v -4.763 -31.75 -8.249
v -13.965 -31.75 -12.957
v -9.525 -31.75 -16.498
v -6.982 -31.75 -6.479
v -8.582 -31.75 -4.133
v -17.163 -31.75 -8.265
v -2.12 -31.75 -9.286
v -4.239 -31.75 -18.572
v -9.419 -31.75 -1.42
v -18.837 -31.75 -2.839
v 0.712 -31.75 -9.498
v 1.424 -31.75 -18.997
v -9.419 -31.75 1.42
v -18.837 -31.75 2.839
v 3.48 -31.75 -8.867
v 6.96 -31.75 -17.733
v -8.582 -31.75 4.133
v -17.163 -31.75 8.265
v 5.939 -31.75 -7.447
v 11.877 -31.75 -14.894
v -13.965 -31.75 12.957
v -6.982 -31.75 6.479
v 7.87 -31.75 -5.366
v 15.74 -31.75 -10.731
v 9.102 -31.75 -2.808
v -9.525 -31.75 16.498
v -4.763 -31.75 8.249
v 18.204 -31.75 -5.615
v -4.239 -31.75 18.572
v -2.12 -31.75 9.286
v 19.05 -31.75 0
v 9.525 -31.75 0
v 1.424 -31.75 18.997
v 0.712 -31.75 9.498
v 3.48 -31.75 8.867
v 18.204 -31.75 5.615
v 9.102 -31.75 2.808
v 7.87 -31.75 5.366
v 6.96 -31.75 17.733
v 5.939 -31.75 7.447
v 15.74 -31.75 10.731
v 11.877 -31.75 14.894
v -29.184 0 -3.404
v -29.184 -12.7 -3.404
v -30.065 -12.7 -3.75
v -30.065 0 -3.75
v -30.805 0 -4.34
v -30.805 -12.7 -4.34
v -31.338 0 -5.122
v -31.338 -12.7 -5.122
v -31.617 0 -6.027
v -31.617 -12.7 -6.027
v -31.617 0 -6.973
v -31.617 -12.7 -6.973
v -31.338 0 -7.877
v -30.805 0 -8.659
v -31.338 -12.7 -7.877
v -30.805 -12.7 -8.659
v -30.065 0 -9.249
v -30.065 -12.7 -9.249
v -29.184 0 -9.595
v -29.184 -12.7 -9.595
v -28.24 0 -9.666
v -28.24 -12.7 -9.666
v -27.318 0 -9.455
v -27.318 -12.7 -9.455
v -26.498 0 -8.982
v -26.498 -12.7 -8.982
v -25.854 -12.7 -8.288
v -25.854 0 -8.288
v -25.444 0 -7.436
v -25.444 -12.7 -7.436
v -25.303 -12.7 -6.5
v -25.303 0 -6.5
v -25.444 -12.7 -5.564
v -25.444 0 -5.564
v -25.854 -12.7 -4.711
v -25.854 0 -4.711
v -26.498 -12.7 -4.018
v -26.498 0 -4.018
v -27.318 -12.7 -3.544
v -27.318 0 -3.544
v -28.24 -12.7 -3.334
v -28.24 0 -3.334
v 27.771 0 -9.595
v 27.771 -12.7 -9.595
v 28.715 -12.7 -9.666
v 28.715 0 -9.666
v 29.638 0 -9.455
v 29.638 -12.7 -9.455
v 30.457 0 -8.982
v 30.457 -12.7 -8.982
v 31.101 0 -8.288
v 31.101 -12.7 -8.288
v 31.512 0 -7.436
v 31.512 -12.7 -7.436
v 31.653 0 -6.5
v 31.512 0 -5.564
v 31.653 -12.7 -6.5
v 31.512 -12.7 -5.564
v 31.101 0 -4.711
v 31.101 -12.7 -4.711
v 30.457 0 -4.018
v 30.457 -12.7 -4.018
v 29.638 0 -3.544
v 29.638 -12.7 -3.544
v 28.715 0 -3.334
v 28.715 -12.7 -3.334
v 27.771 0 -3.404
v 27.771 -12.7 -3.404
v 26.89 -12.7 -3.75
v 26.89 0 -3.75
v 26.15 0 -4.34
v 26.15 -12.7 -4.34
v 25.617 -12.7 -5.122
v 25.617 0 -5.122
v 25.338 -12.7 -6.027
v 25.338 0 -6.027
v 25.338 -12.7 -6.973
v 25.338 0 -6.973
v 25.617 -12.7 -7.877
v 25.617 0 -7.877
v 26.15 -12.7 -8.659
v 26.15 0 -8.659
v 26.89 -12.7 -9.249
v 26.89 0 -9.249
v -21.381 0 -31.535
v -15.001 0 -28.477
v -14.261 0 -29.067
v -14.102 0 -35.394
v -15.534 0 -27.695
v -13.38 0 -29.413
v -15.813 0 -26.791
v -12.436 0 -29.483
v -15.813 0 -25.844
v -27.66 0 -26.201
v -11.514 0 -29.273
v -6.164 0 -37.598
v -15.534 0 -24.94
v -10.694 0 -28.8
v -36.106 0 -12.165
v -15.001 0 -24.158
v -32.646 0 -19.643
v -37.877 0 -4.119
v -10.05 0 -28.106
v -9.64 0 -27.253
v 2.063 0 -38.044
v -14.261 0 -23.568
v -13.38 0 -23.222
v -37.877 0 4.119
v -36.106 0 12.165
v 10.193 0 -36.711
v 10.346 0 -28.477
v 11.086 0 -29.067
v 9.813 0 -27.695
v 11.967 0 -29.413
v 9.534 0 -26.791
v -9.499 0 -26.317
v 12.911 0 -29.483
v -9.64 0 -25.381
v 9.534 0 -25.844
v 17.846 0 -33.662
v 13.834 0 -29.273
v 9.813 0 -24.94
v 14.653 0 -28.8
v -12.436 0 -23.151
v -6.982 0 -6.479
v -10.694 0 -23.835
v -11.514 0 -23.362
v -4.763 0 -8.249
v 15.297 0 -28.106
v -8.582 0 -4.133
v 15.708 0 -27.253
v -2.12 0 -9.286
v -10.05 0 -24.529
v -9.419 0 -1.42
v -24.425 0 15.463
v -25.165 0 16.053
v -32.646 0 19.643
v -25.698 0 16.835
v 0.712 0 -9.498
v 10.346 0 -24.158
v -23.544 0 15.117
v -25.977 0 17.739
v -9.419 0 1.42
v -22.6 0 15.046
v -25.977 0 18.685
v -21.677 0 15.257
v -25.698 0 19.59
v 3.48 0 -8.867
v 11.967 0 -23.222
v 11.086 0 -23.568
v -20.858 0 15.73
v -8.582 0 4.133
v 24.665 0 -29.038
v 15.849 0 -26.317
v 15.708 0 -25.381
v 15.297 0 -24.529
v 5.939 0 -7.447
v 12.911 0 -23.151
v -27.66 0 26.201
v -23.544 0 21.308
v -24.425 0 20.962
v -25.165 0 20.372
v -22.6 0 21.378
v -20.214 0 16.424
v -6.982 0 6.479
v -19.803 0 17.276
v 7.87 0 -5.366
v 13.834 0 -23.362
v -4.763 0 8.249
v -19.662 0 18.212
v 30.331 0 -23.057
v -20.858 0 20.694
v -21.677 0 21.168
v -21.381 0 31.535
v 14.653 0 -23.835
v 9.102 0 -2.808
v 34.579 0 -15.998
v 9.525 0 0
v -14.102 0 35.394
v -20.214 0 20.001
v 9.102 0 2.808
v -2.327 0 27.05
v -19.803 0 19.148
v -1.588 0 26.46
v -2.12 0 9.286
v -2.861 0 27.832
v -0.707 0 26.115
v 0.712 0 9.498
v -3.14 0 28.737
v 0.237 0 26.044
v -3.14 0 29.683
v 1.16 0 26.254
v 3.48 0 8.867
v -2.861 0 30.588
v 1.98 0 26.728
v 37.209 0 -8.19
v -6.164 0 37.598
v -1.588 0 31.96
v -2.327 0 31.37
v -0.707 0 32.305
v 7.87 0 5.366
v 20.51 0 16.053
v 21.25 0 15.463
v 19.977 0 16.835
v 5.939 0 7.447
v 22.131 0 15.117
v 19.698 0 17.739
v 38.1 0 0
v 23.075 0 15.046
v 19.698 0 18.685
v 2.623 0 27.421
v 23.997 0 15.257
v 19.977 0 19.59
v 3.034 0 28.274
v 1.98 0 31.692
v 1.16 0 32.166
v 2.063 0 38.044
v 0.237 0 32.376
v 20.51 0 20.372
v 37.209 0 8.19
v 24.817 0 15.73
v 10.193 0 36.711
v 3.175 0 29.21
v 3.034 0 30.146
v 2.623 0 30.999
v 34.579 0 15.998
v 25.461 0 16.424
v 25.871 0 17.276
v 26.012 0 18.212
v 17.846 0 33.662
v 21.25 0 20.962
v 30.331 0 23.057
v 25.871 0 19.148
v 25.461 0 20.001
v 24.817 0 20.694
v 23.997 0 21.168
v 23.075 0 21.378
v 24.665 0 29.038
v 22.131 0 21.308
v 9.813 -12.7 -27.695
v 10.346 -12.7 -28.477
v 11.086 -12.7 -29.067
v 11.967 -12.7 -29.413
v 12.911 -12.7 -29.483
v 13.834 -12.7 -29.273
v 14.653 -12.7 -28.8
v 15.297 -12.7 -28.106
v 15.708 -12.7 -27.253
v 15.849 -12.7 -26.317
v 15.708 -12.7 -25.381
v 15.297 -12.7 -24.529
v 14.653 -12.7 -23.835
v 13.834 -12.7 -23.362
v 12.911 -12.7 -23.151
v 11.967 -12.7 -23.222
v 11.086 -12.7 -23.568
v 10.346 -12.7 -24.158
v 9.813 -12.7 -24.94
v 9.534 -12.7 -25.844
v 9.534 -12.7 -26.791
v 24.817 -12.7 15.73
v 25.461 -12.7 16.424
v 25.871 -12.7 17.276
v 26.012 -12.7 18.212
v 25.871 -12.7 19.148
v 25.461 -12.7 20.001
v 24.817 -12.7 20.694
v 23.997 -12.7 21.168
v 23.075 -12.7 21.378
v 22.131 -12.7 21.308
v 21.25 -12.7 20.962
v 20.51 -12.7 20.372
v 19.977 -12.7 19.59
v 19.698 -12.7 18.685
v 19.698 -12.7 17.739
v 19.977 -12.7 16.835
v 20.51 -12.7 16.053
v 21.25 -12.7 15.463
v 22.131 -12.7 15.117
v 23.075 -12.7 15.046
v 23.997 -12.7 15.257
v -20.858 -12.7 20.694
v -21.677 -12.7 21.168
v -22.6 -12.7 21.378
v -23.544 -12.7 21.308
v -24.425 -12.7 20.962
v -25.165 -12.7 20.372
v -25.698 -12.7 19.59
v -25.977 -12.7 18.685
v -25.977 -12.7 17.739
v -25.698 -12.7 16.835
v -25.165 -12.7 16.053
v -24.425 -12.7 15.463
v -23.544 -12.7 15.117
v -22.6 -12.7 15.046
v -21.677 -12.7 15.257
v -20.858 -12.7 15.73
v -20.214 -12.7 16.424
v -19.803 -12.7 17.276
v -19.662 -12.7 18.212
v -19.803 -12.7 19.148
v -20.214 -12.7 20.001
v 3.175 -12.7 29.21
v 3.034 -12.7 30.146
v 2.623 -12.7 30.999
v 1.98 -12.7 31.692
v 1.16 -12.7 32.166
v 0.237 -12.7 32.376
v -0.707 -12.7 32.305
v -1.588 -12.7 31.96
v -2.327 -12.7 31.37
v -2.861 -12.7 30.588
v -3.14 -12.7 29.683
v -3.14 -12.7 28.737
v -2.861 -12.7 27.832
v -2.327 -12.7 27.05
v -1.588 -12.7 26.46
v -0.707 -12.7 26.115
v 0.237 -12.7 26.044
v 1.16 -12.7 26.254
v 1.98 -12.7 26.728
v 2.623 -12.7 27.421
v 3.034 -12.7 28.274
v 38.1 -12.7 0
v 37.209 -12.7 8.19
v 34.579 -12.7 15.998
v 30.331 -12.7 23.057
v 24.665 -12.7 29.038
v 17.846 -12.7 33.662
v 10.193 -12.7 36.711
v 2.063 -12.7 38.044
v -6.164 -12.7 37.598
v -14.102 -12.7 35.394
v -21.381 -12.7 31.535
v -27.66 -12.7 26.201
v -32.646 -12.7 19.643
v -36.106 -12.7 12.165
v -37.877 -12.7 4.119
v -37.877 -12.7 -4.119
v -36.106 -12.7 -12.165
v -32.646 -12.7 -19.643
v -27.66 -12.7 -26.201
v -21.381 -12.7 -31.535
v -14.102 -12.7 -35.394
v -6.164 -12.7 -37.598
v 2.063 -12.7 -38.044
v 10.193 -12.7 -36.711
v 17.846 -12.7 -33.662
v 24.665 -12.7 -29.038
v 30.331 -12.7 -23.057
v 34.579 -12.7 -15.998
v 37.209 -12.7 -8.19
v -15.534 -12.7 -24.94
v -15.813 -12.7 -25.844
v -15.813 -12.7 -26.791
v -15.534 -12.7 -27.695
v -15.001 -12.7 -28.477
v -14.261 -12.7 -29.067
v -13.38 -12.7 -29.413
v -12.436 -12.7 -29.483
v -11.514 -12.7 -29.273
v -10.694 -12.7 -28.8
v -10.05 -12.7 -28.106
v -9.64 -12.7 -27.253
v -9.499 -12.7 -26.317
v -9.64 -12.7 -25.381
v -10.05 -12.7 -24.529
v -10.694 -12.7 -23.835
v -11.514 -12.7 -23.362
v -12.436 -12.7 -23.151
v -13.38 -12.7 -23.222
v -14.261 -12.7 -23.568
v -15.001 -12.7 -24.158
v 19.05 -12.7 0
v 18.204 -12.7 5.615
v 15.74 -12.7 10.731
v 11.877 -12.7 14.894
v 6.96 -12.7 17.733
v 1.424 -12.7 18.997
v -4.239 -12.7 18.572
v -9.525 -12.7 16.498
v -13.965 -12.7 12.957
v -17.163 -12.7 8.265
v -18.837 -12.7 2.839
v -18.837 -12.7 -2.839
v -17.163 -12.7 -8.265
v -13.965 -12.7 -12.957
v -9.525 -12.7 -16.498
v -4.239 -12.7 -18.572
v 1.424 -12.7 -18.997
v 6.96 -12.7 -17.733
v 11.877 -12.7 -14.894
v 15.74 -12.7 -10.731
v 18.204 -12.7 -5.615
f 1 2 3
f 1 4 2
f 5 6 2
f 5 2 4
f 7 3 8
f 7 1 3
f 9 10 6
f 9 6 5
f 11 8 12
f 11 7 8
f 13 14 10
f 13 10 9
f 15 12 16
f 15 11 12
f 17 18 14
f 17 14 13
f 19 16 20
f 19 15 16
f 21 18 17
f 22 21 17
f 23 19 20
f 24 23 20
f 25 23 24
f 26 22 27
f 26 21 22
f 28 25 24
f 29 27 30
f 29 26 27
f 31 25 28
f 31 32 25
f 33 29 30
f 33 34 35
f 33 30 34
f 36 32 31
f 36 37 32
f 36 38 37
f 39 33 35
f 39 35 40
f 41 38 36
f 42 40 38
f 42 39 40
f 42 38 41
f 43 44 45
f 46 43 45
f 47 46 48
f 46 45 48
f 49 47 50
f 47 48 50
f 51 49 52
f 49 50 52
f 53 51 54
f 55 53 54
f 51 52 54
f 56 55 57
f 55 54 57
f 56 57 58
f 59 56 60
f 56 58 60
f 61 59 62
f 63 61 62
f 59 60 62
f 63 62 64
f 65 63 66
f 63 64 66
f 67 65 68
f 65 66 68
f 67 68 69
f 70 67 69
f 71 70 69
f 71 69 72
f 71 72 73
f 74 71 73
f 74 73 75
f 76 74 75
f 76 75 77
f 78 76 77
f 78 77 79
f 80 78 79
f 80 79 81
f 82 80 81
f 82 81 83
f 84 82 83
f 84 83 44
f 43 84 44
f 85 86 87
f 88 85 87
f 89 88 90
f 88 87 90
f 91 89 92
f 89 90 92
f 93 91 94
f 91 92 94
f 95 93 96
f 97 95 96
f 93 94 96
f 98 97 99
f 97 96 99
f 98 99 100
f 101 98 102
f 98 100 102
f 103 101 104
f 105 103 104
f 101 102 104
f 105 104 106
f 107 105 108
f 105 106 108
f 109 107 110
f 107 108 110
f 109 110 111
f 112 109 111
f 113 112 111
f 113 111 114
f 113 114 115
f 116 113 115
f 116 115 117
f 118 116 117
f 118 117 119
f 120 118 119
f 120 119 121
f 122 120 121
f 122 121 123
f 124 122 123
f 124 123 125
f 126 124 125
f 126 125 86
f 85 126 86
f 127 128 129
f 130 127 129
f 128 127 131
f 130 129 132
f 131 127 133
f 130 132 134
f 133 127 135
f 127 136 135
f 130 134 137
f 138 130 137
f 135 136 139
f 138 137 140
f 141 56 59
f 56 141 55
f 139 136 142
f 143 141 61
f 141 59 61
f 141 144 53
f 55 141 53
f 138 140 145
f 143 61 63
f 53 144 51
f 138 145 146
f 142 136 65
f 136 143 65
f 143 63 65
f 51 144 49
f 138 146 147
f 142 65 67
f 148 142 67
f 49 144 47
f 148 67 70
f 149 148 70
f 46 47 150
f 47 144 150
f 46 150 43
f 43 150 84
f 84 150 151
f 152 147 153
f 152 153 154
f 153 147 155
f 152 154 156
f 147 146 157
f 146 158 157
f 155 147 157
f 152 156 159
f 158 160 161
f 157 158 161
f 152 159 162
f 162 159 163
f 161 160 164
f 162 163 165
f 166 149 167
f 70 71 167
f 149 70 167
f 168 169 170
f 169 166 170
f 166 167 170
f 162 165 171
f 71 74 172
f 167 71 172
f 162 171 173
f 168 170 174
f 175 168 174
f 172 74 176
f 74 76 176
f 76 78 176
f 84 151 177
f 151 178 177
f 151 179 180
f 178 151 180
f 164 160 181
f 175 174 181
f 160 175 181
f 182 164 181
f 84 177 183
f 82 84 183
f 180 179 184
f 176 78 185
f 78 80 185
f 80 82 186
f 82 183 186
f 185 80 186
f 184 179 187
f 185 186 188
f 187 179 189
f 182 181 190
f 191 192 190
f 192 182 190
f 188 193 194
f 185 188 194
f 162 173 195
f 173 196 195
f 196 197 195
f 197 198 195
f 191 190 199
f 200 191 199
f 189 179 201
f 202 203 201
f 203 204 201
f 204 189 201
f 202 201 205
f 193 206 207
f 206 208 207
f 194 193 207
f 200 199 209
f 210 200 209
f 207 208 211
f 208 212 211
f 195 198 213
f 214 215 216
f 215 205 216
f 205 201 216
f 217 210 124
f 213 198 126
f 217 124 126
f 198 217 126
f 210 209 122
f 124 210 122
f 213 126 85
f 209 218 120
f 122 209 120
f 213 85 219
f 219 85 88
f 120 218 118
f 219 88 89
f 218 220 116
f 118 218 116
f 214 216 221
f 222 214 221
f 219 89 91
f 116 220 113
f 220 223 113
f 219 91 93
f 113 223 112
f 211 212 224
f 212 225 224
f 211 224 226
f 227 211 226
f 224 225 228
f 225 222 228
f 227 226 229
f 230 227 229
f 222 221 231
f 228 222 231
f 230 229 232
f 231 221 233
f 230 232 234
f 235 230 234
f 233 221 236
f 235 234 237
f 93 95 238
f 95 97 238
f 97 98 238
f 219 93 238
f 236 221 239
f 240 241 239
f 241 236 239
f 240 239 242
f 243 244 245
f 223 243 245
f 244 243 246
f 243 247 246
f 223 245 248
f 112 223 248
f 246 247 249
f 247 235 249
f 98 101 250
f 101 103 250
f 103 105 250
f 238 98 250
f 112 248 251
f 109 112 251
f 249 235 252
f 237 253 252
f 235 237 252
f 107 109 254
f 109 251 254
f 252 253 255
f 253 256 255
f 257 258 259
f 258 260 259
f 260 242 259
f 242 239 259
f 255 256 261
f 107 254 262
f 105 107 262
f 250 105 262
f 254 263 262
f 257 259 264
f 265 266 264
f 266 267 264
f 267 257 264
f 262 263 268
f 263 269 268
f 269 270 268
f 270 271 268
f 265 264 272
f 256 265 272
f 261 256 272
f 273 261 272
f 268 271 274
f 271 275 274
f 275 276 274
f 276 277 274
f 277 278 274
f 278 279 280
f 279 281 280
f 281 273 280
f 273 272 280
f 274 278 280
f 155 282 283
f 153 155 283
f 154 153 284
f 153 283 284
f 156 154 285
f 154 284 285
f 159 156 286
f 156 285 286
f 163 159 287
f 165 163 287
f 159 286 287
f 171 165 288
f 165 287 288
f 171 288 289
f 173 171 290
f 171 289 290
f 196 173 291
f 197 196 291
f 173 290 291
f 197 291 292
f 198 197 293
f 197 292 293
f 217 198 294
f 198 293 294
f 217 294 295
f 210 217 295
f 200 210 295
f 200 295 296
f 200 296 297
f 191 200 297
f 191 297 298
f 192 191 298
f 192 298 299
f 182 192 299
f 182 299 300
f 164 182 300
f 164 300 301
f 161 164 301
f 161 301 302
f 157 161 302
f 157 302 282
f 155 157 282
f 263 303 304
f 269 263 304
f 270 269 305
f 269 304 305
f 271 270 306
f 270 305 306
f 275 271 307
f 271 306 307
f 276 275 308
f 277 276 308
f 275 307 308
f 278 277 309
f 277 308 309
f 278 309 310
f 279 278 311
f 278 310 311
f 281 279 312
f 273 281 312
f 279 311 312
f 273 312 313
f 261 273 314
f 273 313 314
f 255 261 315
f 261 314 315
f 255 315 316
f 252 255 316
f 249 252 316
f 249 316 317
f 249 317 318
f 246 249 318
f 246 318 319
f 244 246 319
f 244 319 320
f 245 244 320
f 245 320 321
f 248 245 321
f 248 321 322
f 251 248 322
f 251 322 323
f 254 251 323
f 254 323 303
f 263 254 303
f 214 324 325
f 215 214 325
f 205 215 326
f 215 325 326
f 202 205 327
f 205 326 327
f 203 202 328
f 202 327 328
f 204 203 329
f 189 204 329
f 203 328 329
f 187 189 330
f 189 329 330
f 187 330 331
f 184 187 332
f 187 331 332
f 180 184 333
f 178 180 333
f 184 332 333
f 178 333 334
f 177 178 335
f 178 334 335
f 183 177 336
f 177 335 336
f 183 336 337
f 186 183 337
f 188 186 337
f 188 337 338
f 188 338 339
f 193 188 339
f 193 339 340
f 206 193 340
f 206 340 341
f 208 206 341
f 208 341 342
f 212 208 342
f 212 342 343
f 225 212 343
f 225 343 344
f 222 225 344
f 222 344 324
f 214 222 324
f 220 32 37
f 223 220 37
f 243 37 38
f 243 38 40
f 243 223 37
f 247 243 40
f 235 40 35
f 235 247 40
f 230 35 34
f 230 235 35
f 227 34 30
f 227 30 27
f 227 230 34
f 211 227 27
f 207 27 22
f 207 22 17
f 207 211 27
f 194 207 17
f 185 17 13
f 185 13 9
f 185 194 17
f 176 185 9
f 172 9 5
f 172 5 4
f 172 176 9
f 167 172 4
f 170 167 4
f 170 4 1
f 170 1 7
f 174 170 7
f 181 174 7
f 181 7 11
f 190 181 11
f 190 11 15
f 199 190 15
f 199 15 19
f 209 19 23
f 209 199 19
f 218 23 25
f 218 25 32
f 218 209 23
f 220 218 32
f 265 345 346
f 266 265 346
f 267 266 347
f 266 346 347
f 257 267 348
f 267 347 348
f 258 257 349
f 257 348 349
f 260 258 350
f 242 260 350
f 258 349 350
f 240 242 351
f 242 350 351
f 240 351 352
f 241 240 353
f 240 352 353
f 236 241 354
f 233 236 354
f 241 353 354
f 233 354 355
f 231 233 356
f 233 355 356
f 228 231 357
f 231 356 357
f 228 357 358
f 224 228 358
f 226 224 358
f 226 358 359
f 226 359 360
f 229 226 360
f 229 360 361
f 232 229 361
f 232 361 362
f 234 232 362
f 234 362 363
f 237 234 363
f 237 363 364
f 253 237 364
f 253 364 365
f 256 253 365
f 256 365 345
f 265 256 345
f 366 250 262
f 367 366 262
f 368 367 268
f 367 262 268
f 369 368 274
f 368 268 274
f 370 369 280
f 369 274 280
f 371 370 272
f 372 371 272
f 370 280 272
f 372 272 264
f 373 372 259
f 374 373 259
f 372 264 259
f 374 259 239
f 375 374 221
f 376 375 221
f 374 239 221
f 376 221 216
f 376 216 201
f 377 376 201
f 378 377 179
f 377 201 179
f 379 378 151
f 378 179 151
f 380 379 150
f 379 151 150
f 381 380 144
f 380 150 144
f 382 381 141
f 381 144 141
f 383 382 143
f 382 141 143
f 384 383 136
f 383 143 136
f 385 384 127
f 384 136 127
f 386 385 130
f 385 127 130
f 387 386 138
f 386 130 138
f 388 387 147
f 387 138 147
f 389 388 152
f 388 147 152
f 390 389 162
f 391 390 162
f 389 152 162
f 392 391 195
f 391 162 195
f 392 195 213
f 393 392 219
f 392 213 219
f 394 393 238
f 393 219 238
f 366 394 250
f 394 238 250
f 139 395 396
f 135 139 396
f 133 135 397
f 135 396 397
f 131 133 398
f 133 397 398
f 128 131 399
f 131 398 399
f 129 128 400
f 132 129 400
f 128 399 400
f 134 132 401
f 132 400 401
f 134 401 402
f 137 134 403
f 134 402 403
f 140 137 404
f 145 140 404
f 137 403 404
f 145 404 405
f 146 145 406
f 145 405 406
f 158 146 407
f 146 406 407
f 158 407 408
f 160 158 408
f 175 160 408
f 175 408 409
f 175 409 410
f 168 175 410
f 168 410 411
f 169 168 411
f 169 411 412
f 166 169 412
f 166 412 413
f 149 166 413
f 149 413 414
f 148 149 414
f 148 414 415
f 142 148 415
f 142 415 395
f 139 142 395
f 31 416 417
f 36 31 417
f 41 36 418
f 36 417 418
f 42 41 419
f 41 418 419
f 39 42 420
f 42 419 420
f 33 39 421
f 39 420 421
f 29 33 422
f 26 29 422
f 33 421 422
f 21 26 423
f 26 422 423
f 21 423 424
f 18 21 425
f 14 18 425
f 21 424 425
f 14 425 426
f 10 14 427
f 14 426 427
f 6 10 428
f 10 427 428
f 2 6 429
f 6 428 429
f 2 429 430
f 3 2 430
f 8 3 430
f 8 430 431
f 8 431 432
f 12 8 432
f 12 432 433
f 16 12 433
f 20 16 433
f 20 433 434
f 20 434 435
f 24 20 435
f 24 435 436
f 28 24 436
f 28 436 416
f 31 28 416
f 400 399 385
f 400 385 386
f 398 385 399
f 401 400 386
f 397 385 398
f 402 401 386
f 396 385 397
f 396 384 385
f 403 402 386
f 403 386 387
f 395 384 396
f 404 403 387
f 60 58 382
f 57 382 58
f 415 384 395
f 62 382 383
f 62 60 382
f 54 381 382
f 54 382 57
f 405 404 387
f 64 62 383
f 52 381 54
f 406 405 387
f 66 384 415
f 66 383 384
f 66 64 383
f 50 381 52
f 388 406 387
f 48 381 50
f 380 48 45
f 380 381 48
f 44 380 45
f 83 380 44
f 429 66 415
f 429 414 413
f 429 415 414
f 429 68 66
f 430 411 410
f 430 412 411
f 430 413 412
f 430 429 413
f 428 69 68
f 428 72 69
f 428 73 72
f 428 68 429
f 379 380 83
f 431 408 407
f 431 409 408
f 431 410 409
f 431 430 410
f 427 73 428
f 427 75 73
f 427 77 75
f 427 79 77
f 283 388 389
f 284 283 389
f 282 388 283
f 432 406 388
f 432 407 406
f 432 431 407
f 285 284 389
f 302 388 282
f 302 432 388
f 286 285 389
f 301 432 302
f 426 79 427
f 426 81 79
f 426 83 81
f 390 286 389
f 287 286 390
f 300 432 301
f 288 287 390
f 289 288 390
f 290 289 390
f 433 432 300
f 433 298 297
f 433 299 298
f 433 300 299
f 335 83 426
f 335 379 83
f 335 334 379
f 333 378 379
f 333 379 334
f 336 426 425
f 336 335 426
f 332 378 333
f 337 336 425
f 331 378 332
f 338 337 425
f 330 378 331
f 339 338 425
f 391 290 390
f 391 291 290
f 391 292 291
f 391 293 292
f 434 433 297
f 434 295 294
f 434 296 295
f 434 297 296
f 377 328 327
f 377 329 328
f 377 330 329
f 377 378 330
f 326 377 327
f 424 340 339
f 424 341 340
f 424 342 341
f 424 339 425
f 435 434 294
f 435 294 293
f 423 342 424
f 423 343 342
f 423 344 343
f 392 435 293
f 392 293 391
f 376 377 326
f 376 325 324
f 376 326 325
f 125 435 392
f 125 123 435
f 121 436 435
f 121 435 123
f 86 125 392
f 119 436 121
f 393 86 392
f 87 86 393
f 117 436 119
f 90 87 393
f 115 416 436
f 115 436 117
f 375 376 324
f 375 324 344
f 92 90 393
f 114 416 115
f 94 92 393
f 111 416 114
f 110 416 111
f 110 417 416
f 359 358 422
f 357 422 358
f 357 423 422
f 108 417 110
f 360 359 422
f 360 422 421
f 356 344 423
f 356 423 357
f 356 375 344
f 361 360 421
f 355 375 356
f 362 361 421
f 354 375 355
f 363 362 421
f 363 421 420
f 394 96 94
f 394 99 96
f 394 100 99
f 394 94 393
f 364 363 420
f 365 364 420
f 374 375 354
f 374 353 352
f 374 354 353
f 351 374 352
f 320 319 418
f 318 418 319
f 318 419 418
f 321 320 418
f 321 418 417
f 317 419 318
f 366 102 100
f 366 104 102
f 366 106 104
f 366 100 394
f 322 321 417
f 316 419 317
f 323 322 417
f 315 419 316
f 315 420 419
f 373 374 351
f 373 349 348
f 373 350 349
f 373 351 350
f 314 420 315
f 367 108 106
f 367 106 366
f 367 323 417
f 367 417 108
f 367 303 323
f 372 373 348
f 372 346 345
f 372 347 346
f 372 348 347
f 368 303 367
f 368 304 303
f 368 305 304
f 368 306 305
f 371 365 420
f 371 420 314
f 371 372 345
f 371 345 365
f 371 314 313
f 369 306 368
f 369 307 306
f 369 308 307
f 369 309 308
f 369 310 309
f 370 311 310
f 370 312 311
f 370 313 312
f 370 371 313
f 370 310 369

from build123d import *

# Parameters (mm, degrees)
F0_R            = 38.1
F0_R_2          = 19.05
F1_DEPTH        = 12.7
F0_R_3          = 9.525
F2_DEPTH        = 31.75
F3_R            = 3.175
F4_DEPTH        = 12.701
F4_COPIES_COUNT = 7


# Not quite as in the source:
# - a pattern or mirror of a feature is missing from the dataset's text; its kind, count and spacing are read off the source's solid


with BuildPart() as f1:
    # F0 (on Front) → F1 (new body)
    with BuildSketch(Plane.XZ):
        Circle(F0_R)
        Circle(F0_R_2, mode=Mode.SUBTRACT)
    extrude(amount=F1_DEPTH)

    # F0 (on Front) → F2 (join)
    with BuildSketch(Plane.XZ):
        Circle(F0_R_2)
        Circle(F0_R_3, mode=Mode.SUBTRACT)
    extrude(amount=F2_DEPTH)

    # F3 (on face) → F4 (cut, through all)
    with BuildSketch(Plane.XZ.offset(12.7)):
        with Locations((0, 29.21)):
            Circle(F3_R)
    f4 = extrude(amount=-F4_DEPTH, mode=Mode.SUBTRACT)

    # F4_copies: F4 ×7 about axis
    f4_copies_axis = Axis((0, 0, 0), (0, 1, 0))
    for i in range(1, F4_COPIES_COUNT):
        add(f4.rotate(f4_copies_axis, i * 360 / F4_COPIES_COUNT), mode=Mode.SUBTRACT)


solid = f1.part
